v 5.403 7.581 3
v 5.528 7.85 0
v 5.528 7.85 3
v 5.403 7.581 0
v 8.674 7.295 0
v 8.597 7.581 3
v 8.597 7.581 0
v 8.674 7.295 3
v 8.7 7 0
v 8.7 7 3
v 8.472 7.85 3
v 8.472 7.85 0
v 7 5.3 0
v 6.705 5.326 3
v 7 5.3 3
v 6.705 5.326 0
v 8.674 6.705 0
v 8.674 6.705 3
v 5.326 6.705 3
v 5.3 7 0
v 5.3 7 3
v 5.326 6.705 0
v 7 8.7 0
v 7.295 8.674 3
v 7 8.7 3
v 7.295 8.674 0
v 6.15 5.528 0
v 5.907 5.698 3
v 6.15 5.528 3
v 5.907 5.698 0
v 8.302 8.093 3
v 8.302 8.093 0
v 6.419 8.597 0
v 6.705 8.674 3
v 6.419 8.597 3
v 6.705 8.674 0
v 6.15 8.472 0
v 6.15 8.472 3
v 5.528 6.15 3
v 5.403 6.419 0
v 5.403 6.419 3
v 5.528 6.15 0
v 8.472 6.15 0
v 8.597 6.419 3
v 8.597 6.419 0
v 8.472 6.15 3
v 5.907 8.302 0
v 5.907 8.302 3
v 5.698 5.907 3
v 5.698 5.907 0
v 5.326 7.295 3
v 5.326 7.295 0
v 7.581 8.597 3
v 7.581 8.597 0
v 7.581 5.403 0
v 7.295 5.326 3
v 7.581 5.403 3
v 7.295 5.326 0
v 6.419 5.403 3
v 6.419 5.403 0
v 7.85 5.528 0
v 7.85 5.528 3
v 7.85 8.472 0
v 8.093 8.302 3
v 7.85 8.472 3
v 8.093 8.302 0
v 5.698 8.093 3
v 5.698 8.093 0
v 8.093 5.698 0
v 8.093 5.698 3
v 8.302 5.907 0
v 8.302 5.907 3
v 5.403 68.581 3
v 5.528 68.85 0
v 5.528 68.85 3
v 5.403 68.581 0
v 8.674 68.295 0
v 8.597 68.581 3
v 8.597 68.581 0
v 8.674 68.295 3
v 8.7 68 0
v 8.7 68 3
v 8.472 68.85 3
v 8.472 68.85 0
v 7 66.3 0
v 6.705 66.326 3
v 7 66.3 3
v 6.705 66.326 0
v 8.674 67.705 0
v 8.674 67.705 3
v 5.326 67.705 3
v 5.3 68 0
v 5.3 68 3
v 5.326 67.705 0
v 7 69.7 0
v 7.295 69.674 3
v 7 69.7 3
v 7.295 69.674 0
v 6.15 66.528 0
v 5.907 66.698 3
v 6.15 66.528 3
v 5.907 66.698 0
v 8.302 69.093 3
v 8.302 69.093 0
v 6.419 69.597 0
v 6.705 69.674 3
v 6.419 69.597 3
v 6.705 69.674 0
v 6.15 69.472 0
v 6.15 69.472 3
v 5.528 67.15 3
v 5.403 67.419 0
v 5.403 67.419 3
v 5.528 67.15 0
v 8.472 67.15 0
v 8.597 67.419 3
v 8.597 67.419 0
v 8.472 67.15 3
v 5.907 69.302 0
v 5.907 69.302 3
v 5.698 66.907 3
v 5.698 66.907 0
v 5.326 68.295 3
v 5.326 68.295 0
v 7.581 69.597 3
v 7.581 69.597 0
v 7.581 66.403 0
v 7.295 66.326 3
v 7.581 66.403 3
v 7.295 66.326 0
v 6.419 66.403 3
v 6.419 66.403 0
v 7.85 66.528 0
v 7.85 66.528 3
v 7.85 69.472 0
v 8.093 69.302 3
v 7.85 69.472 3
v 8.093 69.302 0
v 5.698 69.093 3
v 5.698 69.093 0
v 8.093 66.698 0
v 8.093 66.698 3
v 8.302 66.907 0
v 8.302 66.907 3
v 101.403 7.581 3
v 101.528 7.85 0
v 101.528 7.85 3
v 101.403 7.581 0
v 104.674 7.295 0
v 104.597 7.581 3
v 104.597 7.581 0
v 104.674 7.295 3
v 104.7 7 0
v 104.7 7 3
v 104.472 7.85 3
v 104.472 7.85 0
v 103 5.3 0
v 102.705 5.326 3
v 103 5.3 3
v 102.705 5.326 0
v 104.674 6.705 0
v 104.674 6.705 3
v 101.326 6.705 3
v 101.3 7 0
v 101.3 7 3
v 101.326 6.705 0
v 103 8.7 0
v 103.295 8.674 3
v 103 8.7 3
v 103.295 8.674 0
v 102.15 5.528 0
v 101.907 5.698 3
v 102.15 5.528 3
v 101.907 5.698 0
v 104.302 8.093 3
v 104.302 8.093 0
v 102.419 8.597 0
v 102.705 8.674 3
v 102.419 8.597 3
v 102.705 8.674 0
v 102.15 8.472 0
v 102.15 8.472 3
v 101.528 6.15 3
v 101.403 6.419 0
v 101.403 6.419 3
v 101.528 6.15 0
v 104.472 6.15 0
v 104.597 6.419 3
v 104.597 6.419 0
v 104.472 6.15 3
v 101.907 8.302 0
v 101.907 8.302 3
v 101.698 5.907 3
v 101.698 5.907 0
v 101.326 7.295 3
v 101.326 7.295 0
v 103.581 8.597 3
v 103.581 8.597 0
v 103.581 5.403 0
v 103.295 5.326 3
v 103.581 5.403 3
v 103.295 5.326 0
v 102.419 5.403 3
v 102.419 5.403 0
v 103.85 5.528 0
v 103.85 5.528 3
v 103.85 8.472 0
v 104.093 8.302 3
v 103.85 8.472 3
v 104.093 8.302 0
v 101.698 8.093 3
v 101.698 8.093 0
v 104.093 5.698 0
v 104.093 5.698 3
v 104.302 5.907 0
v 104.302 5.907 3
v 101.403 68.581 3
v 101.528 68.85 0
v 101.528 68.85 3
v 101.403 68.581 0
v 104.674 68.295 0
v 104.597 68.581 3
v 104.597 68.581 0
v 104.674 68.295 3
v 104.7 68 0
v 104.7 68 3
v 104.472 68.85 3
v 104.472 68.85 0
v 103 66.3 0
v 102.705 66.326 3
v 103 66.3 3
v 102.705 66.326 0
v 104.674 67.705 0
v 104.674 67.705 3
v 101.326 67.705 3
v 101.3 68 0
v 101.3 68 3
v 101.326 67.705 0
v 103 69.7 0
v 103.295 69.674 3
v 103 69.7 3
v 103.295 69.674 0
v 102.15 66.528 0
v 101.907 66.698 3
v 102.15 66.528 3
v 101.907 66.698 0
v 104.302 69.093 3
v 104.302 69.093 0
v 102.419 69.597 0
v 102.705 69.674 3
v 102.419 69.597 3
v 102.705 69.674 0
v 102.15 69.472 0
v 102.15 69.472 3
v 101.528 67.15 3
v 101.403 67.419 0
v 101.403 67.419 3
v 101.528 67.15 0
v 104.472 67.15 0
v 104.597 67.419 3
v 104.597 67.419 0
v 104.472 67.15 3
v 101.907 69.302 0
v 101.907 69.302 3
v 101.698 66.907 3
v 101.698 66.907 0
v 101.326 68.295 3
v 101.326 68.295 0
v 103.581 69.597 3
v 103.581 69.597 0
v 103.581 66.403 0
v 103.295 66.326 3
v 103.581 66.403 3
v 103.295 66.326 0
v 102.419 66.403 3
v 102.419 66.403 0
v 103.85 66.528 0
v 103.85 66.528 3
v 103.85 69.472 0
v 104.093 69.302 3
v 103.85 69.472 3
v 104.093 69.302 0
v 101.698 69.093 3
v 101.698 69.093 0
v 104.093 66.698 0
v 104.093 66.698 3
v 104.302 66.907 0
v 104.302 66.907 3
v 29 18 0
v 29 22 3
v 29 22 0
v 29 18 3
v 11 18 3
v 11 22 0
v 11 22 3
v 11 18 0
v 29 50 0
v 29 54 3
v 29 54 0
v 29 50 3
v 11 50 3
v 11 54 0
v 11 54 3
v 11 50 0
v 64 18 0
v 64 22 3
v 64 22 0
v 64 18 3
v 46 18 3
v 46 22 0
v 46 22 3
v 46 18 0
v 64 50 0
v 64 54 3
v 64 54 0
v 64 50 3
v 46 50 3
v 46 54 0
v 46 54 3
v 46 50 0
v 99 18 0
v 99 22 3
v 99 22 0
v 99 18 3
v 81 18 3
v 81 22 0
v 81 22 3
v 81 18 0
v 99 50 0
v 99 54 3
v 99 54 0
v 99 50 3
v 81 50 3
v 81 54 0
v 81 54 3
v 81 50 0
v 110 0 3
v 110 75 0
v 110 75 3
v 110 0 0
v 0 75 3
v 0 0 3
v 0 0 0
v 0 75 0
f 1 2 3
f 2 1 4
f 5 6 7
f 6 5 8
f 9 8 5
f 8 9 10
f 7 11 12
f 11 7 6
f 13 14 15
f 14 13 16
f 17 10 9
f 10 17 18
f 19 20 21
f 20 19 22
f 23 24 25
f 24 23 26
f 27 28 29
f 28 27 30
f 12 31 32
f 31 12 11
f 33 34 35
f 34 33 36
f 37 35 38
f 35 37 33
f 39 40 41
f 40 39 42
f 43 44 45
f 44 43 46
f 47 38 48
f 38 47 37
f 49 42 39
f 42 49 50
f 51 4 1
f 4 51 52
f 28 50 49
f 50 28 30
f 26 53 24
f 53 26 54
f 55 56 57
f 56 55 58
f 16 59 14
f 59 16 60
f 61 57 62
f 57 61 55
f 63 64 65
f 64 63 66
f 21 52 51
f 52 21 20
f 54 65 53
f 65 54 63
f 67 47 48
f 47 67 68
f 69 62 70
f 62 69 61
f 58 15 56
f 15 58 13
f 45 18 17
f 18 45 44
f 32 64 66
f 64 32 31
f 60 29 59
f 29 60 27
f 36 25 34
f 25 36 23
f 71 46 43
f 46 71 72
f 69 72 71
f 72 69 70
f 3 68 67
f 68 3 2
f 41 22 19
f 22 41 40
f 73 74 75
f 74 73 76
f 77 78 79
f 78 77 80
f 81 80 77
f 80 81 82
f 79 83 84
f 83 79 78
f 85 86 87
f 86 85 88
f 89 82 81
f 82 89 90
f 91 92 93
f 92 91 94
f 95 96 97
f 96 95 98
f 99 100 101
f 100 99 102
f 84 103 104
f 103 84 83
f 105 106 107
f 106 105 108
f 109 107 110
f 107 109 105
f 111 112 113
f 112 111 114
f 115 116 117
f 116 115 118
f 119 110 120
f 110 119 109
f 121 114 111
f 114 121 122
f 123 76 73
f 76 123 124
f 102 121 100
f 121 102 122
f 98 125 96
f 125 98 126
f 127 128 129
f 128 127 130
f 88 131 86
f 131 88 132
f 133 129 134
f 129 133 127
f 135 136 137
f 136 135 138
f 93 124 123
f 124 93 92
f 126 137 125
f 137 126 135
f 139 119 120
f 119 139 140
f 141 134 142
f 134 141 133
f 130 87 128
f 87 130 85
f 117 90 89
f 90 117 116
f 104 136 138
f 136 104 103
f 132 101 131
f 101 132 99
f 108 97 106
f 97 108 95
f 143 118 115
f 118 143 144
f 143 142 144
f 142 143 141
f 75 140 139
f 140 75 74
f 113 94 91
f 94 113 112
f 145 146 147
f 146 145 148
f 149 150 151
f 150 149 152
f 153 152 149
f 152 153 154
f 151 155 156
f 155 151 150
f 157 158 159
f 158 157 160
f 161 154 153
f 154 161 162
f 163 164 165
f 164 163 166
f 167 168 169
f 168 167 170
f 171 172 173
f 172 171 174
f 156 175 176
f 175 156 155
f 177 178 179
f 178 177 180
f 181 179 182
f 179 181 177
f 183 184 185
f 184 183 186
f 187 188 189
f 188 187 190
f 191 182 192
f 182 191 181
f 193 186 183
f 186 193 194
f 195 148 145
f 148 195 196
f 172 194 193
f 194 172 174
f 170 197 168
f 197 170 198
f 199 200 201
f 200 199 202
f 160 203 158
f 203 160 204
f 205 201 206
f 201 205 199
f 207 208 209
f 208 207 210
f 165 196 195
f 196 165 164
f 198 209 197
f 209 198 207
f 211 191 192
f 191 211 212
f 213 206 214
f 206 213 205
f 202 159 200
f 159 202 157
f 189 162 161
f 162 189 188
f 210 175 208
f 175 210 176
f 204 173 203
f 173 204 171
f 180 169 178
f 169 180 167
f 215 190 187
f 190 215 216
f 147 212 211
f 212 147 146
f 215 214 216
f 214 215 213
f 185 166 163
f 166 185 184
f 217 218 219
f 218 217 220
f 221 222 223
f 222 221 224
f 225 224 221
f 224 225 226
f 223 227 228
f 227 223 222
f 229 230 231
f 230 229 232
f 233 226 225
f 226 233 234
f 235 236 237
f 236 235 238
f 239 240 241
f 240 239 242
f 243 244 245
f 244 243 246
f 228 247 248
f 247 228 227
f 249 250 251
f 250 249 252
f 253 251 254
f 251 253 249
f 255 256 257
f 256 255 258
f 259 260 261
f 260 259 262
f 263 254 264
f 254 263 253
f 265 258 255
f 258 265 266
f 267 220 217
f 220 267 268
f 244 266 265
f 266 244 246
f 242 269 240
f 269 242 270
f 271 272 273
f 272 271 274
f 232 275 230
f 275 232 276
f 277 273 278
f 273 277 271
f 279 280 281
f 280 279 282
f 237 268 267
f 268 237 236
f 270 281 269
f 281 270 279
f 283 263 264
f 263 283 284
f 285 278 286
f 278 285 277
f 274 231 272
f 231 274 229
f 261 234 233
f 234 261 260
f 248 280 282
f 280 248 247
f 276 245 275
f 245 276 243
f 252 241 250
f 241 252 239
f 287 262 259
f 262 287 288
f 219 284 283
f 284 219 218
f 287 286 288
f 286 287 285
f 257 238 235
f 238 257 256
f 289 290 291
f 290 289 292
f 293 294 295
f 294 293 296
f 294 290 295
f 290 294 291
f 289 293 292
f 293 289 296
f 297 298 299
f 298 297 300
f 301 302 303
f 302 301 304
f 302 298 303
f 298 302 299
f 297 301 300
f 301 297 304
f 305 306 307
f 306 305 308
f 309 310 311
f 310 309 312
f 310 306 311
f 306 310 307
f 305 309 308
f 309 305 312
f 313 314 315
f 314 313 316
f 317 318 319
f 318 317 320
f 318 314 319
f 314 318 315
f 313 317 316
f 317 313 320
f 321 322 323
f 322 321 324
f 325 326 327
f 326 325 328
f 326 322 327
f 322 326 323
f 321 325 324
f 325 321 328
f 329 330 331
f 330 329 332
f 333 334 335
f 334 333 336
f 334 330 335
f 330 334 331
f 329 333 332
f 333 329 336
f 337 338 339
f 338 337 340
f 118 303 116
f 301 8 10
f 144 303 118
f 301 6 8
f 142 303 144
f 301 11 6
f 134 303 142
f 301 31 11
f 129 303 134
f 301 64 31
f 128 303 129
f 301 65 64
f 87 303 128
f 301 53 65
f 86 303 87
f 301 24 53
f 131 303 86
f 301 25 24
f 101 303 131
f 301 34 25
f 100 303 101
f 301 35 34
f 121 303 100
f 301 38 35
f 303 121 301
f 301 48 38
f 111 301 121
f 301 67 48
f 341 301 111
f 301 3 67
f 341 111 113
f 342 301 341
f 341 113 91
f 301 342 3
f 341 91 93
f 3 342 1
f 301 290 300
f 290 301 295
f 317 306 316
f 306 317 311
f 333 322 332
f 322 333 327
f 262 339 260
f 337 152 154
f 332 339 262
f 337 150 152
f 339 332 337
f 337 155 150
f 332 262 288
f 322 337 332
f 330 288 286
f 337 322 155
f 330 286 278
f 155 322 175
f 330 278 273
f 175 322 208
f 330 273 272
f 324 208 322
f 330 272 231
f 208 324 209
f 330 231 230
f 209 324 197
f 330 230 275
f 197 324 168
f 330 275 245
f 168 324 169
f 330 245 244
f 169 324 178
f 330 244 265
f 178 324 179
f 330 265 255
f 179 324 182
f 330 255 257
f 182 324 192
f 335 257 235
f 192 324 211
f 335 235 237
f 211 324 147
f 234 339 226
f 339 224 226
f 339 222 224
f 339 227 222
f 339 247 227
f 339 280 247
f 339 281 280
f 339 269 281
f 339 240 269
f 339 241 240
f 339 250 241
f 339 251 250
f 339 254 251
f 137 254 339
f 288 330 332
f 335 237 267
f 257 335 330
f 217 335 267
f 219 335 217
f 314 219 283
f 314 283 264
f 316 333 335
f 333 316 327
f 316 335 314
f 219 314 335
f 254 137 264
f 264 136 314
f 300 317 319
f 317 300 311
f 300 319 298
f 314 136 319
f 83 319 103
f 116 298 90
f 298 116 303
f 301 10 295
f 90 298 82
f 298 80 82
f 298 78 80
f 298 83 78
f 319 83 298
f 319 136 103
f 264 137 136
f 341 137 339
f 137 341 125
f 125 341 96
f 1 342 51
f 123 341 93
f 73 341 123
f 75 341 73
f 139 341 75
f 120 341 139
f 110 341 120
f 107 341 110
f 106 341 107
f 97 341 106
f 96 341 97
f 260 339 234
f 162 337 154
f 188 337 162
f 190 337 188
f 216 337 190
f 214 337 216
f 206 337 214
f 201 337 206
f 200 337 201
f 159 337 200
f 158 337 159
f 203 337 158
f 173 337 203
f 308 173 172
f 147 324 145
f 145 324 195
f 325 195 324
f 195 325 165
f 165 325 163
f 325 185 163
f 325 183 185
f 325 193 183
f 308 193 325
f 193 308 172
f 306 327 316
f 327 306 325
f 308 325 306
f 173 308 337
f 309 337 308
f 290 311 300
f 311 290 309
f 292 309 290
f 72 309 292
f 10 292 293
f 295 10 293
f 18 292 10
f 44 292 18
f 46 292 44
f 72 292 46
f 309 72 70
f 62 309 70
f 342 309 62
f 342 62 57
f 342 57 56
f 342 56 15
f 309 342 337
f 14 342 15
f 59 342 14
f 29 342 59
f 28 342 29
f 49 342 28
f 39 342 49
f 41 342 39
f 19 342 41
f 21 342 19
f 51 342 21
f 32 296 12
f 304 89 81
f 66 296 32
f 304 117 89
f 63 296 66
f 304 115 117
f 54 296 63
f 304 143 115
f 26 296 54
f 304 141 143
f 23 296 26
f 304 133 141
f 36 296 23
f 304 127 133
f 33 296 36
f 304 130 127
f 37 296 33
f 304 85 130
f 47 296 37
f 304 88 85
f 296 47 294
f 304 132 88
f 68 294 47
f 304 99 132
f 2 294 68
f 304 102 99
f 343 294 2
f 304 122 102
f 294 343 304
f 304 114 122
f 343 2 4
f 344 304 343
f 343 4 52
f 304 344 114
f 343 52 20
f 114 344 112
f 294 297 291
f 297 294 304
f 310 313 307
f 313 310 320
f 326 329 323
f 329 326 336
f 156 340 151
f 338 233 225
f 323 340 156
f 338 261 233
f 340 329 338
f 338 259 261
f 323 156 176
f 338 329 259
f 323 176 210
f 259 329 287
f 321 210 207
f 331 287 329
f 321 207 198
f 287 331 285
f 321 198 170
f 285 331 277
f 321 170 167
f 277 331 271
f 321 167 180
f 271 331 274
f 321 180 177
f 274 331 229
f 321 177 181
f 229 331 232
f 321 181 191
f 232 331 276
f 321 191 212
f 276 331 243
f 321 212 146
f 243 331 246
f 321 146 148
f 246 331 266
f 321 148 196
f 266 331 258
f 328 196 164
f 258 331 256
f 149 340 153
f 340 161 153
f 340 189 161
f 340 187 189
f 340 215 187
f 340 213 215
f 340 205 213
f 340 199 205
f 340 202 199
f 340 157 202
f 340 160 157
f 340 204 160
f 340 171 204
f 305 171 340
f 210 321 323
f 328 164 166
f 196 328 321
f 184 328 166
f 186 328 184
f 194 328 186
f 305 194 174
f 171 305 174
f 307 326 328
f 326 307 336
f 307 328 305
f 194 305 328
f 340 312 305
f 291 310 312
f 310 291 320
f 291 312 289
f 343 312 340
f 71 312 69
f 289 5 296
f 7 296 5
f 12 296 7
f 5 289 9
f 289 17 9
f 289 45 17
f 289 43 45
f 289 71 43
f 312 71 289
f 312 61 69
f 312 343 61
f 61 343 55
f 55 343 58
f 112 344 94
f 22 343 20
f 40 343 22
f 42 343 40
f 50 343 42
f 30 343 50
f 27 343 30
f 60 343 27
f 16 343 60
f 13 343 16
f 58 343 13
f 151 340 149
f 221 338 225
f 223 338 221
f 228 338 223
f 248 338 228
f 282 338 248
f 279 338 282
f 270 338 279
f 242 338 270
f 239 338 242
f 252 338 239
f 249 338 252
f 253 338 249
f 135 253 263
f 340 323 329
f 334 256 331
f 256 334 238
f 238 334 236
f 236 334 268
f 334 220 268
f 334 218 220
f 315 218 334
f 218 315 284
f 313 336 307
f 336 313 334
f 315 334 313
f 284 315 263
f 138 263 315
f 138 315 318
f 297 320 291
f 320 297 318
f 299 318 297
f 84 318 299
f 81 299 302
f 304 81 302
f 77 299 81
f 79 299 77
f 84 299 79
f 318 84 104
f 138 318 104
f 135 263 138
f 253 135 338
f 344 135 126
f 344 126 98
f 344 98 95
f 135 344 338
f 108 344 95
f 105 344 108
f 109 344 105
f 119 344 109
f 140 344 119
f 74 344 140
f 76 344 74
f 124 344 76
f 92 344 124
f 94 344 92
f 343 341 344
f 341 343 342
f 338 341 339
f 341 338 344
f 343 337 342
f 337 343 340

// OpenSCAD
// Original generic tray, units mm. NOT a waterproof enclosure.
// Measure actual box/boards before printing. No supplier-specific hole pattern.
plate_x=110; plate_y=75; plate_z=3; hole_d=3.4; edge=7;
strap_width=4; strap_length=18;
$fn=36;
difference(){
  cube([plate_x,plate_y,plate_z]);
  for(x=[edge,plate_x-edge])for(y=[edge,plate_y-edge])
    translate([x,y,-1])cylinder(d=hole_d,h=plate_z+2);
  for(x=[20,55,90])for(y=[18,50])
    translate([x-strap_length/2,y,-1])cube([strap_length,strap_width,plate_z+2]);
}
